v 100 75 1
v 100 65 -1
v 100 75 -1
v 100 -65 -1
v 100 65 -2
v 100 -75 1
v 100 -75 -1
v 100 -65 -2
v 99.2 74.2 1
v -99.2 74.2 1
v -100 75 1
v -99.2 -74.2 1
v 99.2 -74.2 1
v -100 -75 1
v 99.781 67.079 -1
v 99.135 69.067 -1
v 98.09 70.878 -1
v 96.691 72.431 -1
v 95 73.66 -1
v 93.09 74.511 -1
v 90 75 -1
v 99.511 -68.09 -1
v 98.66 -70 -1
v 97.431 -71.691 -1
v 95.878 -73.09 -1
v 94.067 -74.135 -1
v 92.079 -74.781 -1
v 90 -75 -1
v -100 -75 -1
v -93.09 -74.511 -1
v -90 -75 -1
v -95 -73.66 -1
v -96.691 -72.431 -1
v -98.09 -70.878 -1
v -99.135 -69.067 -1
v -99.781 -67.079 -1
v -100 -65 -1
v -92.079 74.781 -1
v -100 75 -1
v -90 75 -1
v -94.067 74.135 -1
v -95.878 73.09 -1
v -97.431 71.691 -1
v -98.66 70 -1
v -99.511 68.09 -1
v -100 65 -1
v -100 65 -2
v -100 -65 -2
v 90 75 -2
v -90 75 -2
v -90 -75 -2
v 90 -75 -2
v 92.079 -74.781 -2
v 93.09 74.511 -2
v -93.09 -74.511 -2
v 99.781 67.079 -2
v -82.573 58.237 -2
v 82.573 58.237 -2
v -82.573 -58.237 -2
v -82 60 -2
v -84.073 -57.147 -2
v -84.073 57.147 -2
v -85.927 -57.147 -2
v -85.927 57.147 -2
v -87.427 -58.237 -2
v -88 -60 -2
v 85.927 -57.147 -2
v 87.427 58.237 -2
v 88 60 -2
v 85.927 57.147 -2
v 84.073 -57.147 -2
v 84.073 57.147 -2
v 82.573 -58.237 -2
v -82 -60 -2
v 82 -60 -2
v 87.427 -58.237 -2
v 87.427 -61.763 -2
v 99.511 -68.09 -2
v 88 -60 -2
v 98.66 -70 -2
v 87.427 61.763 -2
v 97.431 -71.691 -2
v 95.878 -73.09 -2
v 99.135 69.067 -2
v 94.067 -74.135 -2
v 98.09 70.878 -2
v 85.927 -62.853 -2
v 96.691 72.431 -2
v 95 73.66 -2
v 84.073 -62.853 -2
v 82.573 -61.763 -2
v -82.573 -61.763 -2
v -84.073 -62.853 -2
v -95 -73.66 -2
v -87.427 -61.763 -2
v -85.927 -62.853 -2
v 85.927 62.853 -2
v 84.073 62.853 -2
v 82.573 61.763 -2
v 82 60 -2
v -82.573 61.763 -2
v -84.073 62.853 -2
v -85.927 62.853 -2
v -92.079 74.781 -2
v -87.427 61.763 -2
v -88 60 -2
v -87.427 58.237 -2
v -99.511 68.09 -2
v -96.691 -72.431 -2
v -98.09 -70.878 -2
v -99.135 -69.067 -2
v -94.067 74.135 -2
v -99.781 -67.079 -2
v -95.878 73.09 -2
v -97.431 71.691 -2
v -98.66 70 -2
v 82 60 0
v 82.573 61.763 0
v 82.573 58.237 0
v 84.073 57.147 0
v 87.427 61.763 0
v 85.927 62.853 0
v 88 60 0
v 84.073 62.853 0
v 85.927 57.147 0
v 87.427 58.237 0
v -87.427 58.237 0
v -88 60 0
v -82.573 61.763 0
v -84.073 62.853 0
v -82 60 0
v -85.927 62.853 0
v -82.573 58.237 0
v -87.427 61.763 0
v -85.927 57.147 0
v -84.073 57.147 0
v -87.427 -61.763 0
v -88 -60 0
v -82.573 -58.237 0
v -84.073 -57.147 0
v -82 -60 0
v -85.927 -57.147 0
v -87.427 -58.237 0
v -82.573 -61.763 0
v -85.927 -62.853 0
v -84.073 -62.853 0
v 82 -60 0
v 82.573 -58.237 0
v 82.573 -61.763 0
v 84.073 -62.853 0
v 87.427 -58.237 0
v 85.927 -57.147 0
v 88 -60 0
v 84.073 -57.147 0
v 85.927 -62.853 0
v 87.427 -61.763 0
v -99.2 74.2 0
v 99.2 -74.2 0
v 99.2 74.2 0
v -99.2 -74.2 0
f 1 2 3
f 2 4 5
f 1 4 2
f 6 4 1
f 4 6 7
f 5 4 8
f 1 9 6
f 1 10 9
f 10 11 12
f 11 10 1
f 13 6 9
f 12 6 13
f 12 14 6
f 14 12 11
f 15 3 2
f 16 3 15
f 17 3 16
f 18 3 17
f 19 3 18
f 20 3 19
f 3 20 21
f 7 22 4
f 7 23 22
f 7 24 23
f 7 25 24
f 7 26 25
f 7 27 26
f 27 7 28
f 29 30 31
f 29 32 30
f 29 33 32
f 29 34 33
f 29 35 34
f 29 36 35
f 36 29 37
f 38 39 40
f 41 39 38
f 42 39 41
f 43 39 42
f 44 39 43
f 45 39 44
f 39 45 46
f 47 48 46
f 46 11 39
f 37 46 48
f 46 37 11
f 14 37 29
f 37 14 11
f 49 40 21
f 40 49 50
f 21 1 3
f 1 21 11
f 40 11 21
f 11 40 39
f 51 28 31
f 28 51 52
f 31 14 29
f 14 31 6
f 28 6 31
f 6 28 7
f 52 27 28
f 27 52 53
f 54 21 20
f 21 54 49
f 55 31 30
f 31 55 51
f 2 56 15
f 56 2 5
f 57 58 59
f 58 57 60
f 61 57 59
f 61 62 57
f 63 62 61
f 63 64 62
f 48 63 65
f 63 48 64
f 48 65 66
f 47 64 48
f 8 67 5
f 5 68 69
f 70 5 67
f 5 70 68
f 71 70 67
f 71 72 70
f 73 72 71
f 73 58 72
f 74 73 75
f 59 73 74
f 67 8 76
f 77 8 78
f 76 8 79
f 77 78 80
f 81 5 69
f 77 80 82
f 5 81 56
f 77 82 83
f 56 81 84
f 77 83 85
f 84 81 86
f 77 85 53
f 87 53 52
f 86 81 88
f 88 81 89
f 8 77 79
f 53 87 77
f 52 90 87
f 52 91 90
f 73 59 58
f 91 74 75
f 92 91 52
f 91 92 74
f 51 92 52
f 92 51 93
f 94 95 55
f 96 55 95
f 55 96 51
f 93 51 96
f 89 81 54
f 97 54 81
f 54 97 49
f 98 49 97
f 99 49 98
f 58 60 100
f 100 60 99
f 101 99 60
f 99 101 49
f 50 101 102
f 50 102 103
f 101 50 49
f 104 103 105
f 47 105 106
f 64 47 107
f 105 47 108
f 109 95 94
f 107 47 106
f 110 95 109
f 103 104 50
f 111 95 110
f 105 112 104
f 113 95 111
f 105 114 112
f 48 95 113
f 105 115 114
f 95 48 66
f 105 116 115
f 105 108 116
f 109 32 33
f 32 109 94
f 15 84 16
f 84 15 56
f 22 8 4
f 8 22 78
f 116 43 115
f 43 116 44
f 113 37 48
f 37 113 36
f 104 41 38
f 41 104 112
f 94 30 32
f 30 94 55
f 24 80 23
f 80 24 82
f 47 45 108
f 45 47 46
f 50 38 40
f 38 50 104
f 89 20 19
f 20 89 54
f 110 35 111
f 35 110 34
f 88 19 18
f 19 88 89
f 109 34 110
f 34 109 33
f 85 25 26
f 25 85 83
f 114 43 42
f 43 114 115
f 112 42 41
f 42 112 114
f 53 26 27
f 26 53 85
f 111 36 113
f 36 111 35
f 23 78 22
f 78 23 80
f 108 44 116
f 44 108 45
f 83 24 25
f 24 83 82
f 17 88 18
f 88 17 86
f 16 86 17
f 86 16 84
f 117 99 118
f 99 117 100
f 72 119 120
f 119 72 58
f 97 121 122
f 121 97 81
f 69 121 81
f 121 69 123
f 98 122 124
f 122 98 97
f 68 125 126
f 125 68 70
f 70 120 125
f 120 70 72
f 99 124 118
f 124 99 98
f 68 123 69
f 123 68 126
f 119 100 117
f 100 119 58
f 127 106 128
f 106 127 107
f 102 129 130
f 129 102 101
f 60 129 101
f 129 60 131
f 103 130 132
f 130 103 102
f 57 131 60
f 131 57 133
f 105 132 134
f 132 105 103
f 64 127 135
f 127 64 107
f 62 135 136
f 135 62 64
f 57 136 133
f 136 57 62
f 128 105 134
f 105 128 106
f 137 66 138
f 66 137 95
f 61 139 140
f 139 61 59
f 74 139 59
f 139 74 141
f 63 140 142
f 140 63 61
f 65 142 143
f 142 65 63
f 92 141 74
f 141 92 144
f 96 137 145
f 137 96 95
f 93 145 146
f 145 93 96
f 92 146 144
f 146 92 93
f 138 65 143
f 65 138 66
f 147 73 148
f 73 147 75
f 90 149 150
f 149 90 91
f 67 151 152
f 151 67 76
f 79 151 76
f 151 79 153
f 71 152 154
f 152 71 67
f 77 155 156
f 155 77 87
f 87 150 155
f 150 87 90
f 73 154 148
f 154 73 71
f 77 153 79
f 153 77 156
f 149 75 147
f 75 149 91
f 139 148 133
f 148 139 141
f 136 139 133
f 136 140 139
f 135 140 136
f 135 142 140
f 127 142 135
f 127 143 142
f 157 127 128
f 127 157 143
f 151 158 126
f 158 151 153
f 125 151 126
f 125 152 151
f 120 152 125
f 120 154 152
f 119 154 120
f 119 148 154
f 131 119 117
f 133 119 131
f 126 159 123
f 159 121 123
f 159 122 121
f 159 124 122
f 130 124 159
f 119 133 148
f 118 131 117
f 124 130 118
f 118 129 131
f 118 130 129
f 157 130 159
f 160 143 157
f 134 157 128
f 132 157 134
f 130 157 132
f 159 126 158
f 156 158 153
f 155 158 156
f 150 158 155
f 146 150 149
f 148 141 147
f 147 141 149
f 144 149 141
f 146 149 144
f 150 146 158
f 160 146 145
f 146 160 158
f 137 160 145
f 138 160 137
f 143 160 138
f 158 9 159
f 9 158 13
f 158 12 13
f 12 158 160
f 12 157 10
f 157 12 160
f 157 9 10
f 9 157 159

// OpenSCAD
// Parameters
sheet_length = 200; //[100:400:1]
sheet_width = 150; //[75:300:1]
sheet_thickness = 2; //[1:6:0.5]
corner_radius = 10; //[5:20:1]
hole_diameter = 6; //[3:12:0.5]
hole_edge_margin = 15; //[8:30:1]
chamfer_size = 0.8; //[0.2:2:0.1]
overlap = 1; //[0.5:2:0.1]

// Base shapes
module sheet_body() {
  color("Silver")
  cube([sheet_length, sheet_width, sheet_thickness], center=true);
}

module rounded_corners() {
  color("Silver")
  translate([0, 0, -sheet_thickness/2])
  linear_extrude(height=sheet_thickness, center=true)
  offset(r=corner_radius)
  square([sheet_length - 2*corner_radius, sheet_width - 2*corner_radius], center=true);
}

module mounting_hole(position) {
  translate(position)
  cylinder(r=hole_diameter/2, h=sheet_thickness + 2*overlap, center=true);
}

module chamfer_edges() {
  color("Silver")
  translate([0, 0, sheet_thickness/2 - (sheet_thickness/2 + overlap)/2])
  linear_extrude(height=sheet_thickness/2 + overlap)
  offset(delta=-chamfer_size)
  square([sheet_length, sheet_width], center=true);
}

// Operations
module sheet_rounded_union() {
  union() {
    sheet_body();
    rounded_corners();
  }
}

module mounting_holes() {
  union() {
    mounting_hole([sheet_length/2 - hole_edge_margin, sheet_width/2 - hole_edge_margin, 0]);
    mounting_hole([-sheet_length/2 + hole_edge_margin, sheet_width/2 - hole_edge_margin, 0]);
    mounting_hole([-sheet_length/2 + hole_edge_margin, -sheet_width/2 + hole_edge_margin, 0]);
    mounting_hole([sheet_length/2 - hole_edge_margin, -sheet_width/2 + hole_edge_margin, 0]);
  }
}

module sheet_minus_holes() {
  difference() {
    sheet_rounded_union();
    mounting_holes();
  }
}

module final_sheet() {
  difference() {
    sheet_minus_holes();
    chamfer_edges();
  }
}

// Final output
final_sheet();
